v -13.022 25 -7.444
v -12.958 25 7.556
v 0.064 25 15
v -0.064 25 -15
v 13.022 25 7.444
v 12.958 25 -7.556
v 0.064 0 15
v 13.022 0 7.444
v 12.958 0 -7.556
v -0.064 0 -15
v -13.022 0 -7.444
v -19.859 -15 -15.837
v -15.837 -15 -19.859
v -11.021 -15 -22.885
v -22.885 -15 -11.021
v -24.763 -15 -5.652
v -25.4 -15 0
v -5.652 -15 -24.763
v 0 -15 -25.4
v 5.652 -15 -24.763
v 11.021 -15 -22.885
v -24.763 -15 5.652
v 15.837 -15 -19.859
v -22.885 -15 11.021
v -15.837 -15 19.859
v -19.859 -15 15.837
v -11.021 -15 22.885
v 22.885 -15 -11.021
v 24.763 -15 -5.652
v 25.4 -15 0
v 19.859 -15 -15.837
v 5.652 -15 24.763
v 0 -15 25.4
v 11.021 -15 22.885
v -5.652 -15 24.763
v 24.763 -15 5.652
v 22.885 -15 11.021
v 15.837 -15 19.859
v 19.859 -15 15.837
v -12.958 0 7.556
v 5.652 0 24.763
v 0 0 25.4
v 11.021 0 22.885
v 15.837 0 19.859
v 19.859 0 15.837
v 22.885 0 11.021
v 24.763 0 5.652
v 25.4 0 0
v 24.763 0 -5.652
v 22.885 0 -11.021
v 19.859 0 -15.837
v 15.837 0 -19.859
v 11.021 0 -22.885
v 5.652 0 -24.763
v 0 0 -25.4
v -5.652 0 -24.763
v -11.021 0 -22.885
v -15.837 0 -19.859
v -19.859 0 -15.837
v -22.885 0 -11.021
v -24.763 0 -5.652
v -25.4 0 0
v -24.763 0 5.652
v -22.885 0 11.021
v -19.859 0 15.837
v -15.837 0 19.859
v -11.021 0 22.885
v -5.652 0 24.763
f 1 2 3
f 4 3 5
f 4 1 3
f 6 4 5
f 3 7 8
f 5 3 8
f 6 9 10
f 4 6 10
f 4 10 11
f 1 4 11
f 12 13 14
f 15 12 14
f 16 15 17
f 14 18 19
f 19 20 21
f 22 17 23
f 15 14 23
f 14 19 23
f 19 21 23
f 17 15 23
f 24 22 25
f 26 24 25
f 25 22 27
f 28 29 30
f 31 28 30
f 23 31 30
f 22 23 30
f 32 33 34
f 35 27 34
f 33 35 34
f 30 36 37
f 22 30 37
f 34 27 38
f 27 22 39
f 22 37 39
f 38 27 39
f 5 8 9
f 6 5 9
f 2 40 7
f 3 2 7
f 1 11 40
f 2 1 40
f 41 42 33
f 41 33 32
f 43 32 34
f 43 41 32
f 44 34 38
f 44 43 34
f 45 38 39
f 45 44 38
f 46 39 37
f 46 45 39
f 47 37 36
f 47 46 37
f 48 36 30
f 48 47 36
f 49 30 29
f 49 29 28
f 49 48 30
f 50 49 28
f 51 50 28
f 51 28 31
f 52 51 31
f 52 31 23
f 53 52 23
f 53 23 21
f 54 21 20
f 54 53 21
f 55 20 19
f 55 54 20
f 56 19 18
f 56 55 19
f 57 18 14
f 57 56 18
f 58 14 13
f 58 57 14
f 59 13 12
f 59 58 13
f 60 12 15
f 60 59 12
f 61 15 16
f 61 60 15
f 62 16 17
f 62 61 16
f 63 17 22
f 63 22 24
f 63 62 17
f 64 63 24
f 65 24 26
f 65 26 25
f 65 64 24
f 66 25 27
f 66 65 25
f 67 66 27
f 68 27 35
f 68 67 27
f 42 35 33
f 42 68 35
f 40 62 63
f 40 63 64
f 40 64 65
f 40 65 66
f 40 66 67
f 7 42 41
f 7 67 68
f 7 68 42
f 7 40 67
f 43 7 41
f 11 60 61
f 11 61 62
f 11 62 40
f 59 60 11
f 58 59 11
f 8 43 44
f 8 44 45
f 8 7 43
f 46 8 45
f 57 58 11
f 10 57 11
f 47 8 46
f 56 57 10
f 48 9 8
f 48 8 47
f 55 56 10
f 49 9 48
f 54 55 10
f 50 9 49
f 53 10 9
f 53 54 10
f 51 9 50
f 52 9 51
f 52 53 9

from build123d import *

# Parameters (mm, degrees)
SKETCH1_R           = 25.4
BOSS_EXTRUDE1_DEPTH = 15
BOSS_EXTRUDE2_DEPTH = 25


with BuildPart() as part:
    # Sketch1 → Boss-Extrude1 (new body)
    with BuildSketch(Plane(origin=(0, 0, 0), x_dir=(1, 0, 0), z_dir=(0, 1, 0))):
        Circle(SKETCH1_R)
    extrude(amount=-BOSS_EXTRUDE1_DEPTH)

    # Sketch1<3> → Boss-Extrude2 (add)
    with BuildSketch(Plane(origin=(0, 0, 0), x_dir=(1, 0, 0), z_dir=(0, 1, 0))):
        Polygon((12.958072873, 7.555683121), (-0.064377089, 14.999861852), (-13.022449962, 7.444178731), (-12.958072873, -7.555683121), (0.064377089, -14.999861852), (13.022449962, -7.444178731), align=None)
    extrude(amount=BOSS_EXTRUDE2_DEPTH)


solid = part.part
